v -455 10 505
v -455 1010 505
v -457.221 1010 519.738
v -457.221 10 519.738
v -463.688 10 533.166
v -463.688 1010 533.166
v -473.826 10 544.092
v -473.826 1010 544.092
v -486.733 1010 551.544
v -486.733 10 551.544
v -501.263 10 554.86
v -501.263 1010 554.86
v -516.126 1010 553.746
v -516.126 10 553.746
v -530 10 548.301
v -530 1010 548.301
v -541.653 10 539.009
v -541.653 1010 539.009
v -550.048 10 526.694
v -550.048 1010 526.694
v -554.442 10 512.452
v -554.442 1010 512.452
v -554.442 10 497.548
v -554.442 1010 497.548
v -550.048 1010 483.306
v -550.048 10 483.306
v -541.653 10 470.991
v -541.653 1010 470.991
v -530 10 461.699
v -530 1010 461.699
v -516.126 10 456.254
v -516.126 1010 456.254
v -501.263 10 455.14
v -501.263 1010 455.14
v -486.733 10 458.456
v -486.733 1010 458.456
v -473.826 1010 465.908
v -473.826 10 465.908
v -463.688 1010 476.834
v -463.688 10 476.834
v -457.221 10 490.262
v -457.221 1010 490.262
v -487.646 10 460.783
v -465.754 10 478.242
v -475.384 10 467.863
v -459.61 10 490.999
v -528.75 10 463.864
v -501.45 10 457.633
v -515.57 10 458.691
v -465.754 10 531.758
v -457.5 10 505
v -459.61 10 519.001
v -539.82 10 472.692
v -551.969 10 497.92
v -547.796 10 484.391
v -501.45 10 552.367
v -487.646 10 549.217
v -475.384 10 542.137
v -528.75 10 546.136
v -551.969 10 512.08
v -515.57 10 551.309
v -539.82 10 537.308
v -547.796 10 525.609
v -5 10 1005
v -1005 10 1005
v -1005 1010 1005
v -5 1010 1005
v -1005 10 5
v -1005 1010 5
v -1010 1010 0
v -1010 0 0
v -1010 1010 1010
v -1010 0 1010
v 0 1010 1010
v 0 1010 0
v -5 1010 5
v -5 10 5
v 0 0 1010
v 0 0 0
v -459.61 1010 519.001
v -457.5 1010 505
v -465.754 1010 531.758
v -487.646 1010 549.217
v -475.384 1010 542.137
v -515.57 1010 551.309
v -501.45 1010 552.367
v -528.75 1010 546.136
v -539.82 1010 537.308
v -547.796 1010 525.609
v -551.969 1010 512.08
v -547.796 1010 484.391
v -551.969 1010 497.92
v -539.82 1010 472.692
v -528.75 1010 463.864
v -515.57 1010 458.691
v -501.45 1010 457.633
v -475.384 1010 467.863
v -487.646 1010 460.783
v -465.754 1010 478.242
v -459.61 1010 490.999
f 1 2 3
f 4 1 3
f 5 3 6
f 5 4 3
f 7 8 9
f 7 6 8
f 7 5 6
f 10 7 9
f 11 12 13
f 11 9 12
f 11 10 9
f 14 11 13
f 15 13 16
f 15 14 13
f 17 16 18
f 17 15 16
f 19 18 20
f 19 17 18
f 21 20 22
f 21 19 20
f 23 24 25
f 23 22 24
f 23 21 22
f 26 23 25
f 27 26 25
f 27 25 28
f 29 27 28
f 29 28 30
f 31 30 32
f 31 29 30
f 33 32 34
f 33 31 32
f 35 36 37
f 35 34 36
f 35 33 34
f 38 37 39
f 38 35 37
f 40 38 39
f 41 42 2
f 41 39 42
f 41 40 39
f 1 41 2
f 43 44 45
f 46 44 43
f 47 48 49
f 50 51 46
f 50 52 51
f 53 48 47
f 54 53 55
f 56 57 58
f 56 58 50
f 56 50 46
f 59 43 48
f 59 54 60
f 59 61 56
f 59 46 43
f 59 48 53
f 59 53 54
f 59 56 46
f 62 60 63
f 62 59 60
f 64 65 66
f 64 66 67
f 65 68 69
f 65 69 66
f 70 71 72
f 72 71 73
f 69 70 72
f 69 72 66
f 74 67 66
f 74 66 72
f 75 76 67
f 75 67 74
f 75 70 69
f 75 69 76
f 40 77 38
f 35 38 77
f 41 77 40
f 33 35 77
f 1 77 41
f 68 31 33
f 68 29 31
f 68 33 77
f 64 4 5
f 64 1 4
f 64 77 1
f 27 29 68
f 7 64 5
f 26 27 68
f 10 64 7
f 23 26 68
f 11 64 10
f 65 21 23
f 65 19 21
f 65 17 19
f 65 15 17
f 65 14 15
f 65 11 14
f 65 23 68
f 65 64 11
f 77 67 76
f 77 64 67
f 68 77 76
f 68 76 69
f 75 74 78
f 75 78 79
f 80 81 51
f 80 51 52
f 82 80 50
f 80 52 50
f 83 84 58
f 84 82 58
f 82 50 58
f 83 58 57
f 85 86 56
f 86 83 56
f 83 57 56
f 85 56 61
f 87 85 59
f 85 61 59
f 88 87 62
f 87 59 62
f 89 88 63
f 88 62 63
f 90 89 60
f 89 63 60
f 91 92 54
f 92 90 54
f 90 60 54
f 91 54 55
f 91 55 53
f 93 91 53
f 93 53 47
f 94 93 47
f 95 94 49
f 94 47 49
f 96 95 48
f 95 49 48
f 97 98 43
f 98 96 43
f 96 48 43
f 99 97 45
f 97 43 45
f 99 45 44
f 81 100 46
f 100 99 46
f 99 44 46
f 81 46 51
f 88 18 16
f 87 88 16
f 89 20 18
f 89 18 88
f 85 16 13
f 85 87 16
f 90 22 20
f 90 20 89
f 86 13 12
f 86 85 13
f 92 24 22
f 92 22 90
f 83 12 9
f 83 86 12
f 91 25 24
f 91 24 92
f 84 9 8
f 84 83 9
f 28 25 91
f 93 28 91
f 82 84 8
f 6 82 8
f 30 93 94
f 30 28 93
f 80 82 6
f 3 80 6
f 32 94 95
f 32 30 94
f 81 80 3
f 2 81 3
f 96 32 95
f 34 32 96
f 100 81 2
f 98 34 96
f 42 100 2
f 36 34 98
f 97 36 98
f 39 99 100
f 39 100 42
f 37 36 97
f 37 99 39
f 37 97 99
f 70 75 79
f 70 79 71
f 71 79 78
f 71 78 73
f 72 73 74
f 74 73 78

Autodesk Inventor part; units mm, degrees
ref_plane "YZ Plane" through (0, 0, 0) normal (1, 0, 0) x (0, 1, 0)
ref_plane "XZ Plane" through (0, 0, 0) normal (0, 1, 0) x (-1, 0, 0)
ref_plane "XY Plane" through (0, 0, 0) normal (0, 0, 1) x (1, 0, 0)
sketch "スケッチ1" plane through (0, 0, 0) normal (0, 1, 0) x (-1, 0, 0)
  line L0 (0, 0) -> (1010, 0)
  line L1 (1010, 0) -> (1010, 1010)
  line L2 (1010, 1010) -> (0, 1010)
  line L3 (0, 1010) -> (0, 0)
  dimension "d0" = 1010
  dimension "d1" = 1010
extrude "押し出し1" add sketch "スケッチ1" along normal blind 10
sketch "スケッチ2" plane through (0, 10, 0) normal (0, 1, 0) x (1, 0, 0)
  line L0 (-1005, -1005) -> (-5, -1005)
  line L1 (-5, -1005) -> (-5, -5)
  line L2 (-5, -5) -> (-1005, -5)
  line L3 (-1005, -5) -> (-1005, -1005)
  line L4 (-1010, 0) -> (-1010, -1010) projected
  line L5 (-1010, -1010) -> (0, -1010) projected
  line L6 (0, 0) -> (-1010, 0) projected
  line L7 (-1010, 0) -> (-1010, -1010) projected
  line L8 (-1010, -1010) -> (0, -1010) projected
  line L9 (0, -1010) -> (0, 0) projected
  dimension "d4" = 1000
  dimension "d5" = 1000
  dimension "d6" = 5
  dimension "d7" = 5
extrude "押し出し2" add sketch "スケッチ2" along normal blind 1000
sketch "スケッチ3" plane through (0, 10, 0) normal (0, 1, 0) x (1, 0, 0)
  circle A0 centre (-505, -505) radius 50
  line L0 (-1005, -1005) -> (-1005, -5) projected
  line L1 (-5, -1005) -> (-1005, -1005) projected
  circle A1 centre (-505, -505) radius 47.5
  point P0 (0, 0)
  dimension "d10" = 100
  dimension "d11" = 500
  dimension "d12" = 500
  dimension "d13" = 95
extrude "押し出し3" add sketch "スケッチ3" along normal blind 1000
properties part number "sebis-1"
